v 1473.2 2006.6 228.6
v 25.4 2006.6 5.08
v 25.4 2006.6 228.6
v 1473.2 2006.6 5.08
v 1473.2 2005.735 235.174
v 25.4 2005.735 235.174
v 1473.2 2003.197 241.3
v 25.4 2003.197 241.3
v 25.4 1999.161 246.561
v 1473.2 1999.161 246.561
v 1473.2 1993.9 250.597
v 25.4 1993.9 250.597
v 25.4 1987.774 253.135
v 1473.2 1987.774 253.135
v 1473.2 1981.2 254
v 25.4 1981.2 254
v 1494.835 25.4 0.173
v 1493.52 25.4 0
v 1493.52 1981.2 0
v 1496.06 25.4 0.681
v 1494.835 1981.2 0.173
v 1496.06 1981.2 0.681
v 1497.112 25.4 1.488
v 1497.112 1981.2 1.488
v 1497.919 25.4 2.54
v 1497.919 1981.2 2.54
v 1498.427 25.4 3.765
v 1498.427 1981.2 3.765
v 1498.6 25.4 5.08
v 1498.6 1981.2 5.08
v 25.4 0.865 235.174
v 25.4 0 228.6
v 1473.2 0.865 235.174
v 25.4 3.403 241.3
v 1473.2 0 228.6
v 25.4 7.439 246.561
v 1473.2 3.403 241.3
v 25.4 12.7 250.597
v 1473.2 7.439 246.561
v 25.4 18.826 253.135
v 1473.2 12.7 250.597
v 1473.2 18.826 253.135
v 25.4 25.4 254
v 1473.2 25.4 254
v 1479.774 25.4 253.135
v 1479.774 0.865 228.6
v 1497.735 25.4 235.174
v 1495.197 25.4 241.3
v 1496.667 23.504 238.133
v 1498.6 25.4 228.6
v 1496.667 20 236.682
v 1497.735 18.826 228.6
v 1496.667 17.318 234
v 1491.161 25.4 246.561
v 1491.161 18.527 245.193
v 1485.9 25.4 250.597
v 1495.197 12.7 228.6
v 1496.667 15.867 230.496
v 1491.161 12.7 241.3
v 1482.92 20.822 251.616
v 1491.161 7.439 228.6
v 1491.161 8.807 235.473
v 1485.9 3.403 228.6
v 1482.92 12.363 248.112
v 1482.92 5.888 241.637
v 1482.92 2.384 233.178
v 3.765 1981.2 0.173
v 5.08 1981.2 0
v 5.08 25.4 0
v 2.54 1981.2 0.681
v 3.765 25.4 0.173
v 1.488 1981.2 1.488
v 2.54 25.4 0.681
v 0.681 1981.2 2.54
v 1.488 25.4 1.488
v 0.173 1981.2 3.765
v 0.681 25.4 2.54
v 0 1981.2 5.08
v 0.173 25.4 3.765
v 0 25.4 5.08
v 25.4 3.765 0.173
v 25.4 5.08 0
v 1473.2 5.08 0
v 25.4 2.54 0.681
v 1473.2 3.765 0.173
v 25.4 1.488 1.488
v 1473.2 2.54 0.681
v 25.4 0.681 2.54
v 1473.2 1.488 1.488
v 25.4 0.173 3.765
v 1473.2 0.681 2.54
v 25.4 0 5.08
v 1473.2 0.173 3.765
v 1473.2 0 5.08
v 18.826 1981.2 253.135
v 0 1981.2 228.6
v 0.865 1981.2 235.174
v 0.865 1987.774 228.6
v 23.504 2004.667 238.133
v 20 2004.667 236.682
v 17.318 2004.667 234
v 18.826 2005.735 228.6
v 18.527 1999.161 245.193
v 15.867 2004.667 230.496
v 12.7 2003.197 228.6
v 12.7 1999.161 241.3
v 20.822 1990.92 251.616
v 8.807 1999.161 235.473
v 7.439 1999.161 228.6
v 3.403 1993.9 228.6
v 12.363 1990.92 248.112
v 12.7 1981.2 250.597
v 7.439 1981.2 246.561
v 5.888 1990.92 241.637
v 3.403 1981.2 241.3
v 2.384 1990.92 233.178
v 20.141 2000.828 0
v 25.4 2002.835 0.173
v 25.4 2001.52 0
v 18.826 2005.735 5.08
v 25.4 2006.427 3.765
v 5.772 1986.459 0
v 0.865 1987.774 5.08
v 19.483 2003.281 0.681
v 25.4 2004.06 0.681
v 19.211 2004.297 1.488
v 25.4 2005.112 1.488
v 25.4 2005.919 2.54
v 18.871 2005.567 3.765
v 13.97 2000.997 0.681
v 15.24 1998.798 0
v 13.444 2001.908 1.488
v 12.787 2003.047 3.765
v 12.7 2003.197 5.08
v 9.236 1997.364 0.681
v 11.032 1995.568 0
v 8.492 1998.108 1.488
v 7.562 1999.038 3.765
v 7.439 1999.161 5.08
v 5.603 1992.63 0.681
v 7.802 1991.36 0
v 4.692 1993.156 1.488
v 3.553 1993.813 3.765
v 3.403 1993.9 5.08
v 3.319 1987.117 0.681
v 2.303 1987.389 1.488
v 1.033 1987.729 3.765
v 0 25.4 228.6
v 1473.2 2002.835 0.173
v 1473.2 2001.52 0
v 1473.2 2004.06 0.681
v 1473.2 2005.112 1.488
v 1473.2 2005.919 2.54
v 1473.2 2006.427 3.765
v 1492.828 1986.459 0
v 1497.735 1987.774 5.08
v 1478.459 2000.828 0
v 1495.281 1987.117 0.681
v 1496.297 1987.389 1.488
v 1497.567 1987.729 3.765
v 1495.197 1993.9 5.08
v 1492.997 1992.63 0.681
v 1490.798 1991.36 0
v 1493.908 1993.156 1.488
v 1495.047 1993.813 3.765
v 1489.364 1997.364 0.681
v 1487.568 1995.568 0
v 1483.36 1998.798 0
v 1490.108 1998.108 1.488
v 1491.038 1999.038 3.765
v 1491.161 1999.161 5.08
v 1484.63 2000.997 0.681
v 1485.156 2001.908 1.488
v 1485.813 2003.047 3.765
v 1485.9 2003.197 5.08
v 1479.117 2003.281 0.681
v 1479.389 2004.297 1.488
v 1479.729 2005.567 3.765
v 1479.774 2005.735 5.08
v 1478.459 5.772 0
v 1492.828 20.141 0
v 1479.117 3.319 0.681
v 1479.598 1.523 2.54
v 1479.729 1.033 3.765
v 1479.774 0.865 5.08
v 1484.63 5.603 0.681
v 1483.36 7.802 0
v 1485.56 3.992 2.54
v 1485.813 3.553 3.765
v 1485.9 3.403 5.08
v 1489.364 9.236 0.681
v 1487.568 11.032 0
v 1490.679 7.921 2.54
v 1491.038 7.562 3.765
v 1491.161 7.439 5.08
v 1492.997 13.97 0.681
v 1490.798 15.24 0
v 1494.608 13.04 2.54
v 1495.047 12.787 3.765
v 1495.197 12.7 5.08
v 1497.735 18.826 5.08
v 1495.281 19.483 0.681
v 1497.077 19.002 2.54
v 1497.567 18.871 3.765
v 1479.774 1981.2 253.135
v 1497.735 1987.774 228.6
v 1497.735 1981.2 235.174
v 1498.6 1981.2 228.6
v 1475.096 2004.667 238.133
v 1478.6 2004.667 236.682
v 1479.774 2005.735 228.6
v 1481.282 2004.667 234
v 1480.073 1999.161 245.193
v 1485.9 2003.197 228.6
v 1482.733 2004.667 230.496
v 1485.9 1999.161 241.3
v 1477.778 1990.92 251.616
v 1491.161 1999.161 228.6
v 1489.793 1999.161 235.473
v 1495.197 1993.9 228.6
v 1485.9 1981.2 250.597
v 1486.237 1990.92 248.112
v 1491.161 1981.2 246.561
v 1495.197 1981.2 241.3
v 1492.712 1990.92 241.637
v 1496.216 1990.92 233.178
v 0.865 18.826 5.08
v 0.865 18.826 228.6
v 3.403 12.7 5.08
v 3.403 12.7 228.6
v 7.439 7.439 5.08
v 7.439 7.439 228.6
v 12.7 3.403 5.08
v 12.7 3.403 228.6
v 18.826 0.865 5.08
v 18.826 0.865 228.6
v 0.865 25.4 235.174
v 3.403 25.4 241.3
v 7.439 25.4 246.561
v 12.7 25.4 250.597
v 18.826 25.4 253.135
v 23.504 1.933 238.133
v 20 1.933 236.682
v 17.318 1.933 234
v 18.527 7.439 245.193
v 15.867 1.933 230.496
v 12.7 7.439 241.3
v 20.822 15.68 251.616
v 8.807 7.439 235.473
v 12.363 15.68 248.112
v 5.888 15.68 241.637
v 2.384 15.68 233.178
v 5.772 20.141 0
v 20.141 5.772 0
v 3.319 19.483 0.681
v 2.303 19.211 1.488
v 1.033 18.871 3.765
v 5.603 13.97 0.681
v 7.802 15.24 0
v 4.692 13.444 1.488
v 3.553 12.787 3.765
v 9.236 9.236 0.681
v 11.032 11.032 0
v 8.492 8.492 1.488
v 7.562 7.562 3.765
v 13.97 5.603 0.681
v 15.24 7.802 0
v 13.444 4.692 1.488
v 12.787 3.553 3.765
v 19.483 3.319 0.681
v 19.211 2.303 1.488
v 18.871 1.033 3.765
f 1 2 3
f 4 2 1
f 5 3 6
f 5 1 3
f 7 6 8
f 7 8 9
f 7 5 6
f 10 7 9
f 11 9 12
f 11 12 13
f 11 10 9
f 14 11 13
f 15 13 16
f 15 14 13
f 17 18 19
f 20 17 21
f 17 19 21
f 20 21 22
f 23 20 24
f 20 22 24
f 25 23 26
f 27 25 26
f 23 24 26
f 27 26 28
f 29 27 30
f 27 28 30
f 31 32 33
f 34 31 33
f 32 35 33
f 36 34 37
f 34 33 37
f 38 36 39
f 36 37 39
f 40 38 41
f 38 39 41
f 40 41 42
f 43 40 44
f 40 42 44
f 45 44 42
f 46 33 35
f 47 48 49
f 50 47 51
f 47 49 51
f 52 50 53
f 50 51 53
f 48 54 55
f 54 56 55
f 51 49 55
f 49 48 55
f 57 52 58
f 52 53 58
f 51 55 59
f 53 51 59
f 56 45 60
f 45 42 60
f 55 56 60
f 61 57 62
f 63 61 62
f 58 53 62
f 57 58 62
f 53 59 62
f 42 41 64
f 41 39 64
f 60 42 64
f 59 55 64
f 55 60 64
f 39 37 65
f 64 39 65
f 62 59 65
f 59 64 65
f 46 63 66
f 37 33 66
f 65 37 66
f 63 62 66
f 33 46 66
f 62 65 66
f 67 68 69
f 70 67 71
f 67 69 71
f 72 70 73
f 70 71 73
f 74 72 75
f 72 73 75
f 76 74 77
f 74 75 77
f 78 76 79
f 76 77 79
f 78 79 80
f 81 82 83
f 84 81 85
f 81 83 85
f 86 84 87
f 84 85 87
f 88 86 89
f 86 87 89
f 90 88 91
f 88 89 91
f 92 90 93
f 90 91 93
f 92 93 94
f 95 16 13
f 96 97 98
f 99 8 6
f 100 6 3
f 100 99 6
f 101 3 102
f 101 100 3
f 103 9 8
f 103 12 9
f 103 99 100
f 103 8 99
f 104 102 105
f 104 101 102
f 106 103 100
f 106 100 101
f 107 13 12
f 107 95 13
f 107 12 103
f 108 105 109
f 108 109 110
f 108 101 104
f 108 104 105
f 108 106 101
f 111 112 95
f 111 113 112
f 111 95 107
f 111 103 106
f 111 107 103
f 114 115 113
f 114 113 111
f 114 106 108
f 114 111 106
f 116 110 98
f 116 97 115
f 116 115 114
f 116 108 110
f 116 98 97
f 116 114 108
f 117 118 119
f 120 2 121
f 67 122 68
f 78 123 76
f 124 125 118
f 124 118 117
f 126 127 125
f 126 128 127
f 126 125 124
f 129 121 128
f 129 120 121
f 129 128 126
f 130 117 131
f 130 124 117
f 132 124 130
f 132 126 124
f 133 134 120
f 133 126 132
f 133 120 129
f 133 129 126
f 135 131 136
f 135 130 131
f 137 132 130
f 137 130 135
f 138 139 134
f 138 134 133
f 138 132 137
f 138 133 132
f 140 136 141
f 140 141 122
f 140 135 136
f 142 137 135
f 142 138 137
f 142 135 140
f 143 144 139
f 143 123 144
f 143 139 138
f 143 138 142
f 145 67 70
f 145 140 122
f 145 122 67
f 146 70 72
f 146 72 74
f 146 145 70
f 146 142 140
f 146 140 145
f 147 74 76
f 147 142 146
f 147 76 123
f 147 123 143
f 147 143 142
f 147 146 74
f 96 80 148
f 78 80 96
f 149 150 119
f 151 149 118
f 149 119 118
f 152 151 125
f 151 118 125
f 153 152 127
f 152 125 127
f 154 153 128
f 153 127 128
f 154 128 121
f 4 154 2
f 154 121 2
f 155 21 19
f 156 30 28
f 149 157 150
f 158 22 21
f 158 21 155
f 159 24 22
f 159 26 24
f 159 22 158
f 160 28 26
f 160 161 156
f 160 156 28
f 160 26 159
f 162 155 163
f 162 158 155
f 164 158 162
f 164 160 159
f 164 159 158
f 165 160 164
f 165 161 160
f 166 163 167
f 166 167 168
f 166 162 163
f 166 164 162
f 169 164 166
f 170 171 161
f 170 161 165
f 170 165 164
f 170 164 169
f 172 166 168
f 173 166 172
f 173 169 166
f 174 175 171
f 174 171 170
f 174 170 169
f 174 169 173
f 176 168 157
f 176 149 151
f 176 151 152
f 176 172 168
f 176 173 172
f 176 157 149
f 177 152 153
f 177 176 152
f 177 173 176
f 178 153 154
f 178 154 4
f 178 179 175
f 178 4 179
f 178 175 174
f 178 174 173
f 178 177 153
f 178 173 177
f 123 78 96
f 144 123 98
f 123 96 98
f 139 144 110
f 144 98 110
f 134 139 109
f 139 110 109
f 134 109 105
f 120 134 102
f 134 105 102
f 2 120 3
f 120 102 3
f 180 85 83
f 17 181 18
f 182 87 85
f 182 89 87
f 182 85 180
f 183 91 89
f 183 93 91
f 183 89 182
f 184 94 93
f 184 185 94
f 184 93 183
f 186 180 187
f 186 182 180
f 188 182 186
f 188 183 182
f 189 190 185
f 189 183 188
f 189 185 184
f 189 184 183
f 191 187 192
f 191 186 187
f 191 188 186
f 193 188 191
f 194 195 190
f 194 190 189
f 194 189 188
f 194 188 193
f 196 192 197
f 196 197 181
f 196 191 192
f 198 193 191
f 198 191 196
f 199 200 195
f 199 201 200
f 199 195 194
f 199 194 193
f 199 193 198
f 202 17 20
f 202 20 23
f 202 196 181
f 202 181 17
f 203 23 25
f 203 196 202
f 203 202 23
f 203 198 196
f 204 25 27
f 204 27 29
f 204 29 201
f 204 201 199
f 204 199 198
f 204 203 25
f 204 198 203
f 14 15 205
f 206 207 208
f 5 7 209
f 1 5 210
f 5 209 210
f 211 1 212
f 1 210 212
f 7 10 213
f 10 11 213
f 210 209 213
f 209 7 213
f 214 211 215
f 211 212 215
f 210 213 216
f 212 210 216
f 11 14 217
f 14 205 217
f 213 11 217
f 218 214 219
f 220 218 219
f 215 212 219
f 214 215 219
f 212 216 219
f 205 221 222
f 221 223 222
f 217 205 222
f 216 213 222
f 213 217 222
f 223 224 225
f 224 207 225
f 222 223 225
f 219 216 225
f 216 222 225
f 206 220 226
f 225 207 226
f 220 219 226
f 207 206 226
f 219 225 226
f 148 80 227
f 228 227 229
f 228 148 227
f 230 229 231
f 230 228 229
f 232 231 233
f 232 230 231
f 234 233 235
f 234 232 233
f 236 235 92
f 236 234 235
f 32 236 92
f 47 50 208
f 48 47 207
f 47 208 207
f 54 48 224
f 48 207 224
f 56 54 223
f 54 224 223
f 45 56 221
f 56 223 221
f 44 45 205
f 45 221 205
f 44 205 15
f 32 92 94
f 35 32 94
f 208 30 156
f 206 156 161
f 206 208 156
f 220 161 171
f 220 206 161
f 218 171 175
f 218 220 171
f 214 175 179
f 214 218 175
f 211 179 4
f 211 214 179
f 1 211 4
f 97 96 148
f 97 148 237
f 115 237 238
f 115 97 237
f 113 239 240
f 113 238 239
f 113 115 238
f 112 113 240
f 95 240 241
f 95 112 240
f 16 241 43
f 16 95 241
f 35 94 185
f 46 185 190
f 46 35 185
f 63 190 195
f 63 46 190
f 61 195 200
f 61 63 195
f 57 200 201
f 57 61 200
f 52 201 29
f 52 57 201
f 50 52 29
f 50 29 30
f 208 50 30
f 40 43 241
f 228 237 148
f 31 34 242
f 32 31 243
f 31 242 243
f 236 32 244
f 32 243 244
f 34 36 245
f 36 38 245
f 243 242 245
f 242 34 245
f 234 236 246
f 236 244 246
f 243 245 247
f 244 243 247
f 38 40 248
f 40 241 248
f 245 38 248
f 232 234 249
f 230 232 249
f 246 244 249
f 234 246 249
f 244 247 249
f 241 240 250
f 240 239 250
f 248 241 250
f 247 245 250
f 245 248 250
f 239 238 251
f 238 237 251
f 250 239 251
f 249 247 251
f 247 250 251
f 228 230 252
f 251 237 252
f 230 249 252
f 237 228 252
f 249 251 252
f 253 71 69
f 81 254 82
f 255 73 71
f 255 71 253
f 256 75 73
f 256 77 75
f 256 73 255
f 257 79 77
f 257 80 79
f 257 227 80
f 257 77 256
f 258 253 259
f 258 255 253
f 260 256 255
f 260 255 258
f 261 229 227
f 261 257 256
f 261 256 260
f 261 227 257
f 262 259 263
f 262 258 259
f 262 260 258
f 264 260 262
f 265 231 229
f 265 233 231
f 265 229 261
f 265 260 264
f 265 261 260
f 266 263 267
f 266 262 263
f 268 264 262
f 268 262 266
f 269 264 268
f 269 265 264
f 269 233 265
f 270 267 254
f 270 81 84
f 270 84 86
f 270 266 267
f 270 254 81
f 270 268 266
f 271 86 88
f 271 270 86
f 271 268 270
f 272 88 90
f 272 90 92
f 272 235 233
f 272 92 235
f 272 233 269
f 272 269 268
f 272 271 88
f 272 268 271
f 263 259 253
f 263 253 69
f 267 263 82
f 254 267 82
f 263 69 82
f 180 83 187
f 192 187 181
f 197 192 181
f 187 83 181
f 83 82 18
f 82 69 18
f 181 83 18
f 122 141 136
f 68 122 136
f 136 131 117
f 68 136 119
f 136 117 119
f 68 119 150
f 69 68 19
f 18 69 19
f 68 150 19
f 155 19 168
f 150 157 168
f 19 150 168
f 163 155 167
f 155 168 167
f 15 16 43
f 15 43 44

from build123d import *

# Parameters (mm, degrees)
F0_W     = 1498.6
F0_H     = 2006.6
F1_DEPTH = 254
F2_R     = 25.4
F3_R     = 5.08


with BuildPart() as f1:
    # F0 (on Top) → F1 (new body)
    with BuildSketch(Plane.XY):
        with Locations((749.3, 1003.3)):
            Rectangle(F0_W, F0_H)
    extrude(amount=F1_DEPTH)

    # F2
    f2_edges = [f1.edges().sort_by_distance(p)[0] for p in [
        (0, 1003.3, 254),
        (749.3, 0, 254),
        (1498.6, 1003.3, 254),
        (749.3, 2006.6, 254),
        (1498.6, 0, 127),
        (0, 0, 127),
        (1498.6, 2006.6, 127),
        (0, 2006.6, 127),
    ]]
    fillet(f2_edges, radius=F2_R)

    # F3
    f3_edges = [f1.edges().sort_by_distance(p)[0] for p in [
        (1498.6, 1003.3, 0),
        (749.3, 0, 0),
        (0, 1003.3, 0),
        (749.3, 2006.6, 0),
    ]]
    fillet(f3_edges, radius=F3_R)


solid = f1.part
